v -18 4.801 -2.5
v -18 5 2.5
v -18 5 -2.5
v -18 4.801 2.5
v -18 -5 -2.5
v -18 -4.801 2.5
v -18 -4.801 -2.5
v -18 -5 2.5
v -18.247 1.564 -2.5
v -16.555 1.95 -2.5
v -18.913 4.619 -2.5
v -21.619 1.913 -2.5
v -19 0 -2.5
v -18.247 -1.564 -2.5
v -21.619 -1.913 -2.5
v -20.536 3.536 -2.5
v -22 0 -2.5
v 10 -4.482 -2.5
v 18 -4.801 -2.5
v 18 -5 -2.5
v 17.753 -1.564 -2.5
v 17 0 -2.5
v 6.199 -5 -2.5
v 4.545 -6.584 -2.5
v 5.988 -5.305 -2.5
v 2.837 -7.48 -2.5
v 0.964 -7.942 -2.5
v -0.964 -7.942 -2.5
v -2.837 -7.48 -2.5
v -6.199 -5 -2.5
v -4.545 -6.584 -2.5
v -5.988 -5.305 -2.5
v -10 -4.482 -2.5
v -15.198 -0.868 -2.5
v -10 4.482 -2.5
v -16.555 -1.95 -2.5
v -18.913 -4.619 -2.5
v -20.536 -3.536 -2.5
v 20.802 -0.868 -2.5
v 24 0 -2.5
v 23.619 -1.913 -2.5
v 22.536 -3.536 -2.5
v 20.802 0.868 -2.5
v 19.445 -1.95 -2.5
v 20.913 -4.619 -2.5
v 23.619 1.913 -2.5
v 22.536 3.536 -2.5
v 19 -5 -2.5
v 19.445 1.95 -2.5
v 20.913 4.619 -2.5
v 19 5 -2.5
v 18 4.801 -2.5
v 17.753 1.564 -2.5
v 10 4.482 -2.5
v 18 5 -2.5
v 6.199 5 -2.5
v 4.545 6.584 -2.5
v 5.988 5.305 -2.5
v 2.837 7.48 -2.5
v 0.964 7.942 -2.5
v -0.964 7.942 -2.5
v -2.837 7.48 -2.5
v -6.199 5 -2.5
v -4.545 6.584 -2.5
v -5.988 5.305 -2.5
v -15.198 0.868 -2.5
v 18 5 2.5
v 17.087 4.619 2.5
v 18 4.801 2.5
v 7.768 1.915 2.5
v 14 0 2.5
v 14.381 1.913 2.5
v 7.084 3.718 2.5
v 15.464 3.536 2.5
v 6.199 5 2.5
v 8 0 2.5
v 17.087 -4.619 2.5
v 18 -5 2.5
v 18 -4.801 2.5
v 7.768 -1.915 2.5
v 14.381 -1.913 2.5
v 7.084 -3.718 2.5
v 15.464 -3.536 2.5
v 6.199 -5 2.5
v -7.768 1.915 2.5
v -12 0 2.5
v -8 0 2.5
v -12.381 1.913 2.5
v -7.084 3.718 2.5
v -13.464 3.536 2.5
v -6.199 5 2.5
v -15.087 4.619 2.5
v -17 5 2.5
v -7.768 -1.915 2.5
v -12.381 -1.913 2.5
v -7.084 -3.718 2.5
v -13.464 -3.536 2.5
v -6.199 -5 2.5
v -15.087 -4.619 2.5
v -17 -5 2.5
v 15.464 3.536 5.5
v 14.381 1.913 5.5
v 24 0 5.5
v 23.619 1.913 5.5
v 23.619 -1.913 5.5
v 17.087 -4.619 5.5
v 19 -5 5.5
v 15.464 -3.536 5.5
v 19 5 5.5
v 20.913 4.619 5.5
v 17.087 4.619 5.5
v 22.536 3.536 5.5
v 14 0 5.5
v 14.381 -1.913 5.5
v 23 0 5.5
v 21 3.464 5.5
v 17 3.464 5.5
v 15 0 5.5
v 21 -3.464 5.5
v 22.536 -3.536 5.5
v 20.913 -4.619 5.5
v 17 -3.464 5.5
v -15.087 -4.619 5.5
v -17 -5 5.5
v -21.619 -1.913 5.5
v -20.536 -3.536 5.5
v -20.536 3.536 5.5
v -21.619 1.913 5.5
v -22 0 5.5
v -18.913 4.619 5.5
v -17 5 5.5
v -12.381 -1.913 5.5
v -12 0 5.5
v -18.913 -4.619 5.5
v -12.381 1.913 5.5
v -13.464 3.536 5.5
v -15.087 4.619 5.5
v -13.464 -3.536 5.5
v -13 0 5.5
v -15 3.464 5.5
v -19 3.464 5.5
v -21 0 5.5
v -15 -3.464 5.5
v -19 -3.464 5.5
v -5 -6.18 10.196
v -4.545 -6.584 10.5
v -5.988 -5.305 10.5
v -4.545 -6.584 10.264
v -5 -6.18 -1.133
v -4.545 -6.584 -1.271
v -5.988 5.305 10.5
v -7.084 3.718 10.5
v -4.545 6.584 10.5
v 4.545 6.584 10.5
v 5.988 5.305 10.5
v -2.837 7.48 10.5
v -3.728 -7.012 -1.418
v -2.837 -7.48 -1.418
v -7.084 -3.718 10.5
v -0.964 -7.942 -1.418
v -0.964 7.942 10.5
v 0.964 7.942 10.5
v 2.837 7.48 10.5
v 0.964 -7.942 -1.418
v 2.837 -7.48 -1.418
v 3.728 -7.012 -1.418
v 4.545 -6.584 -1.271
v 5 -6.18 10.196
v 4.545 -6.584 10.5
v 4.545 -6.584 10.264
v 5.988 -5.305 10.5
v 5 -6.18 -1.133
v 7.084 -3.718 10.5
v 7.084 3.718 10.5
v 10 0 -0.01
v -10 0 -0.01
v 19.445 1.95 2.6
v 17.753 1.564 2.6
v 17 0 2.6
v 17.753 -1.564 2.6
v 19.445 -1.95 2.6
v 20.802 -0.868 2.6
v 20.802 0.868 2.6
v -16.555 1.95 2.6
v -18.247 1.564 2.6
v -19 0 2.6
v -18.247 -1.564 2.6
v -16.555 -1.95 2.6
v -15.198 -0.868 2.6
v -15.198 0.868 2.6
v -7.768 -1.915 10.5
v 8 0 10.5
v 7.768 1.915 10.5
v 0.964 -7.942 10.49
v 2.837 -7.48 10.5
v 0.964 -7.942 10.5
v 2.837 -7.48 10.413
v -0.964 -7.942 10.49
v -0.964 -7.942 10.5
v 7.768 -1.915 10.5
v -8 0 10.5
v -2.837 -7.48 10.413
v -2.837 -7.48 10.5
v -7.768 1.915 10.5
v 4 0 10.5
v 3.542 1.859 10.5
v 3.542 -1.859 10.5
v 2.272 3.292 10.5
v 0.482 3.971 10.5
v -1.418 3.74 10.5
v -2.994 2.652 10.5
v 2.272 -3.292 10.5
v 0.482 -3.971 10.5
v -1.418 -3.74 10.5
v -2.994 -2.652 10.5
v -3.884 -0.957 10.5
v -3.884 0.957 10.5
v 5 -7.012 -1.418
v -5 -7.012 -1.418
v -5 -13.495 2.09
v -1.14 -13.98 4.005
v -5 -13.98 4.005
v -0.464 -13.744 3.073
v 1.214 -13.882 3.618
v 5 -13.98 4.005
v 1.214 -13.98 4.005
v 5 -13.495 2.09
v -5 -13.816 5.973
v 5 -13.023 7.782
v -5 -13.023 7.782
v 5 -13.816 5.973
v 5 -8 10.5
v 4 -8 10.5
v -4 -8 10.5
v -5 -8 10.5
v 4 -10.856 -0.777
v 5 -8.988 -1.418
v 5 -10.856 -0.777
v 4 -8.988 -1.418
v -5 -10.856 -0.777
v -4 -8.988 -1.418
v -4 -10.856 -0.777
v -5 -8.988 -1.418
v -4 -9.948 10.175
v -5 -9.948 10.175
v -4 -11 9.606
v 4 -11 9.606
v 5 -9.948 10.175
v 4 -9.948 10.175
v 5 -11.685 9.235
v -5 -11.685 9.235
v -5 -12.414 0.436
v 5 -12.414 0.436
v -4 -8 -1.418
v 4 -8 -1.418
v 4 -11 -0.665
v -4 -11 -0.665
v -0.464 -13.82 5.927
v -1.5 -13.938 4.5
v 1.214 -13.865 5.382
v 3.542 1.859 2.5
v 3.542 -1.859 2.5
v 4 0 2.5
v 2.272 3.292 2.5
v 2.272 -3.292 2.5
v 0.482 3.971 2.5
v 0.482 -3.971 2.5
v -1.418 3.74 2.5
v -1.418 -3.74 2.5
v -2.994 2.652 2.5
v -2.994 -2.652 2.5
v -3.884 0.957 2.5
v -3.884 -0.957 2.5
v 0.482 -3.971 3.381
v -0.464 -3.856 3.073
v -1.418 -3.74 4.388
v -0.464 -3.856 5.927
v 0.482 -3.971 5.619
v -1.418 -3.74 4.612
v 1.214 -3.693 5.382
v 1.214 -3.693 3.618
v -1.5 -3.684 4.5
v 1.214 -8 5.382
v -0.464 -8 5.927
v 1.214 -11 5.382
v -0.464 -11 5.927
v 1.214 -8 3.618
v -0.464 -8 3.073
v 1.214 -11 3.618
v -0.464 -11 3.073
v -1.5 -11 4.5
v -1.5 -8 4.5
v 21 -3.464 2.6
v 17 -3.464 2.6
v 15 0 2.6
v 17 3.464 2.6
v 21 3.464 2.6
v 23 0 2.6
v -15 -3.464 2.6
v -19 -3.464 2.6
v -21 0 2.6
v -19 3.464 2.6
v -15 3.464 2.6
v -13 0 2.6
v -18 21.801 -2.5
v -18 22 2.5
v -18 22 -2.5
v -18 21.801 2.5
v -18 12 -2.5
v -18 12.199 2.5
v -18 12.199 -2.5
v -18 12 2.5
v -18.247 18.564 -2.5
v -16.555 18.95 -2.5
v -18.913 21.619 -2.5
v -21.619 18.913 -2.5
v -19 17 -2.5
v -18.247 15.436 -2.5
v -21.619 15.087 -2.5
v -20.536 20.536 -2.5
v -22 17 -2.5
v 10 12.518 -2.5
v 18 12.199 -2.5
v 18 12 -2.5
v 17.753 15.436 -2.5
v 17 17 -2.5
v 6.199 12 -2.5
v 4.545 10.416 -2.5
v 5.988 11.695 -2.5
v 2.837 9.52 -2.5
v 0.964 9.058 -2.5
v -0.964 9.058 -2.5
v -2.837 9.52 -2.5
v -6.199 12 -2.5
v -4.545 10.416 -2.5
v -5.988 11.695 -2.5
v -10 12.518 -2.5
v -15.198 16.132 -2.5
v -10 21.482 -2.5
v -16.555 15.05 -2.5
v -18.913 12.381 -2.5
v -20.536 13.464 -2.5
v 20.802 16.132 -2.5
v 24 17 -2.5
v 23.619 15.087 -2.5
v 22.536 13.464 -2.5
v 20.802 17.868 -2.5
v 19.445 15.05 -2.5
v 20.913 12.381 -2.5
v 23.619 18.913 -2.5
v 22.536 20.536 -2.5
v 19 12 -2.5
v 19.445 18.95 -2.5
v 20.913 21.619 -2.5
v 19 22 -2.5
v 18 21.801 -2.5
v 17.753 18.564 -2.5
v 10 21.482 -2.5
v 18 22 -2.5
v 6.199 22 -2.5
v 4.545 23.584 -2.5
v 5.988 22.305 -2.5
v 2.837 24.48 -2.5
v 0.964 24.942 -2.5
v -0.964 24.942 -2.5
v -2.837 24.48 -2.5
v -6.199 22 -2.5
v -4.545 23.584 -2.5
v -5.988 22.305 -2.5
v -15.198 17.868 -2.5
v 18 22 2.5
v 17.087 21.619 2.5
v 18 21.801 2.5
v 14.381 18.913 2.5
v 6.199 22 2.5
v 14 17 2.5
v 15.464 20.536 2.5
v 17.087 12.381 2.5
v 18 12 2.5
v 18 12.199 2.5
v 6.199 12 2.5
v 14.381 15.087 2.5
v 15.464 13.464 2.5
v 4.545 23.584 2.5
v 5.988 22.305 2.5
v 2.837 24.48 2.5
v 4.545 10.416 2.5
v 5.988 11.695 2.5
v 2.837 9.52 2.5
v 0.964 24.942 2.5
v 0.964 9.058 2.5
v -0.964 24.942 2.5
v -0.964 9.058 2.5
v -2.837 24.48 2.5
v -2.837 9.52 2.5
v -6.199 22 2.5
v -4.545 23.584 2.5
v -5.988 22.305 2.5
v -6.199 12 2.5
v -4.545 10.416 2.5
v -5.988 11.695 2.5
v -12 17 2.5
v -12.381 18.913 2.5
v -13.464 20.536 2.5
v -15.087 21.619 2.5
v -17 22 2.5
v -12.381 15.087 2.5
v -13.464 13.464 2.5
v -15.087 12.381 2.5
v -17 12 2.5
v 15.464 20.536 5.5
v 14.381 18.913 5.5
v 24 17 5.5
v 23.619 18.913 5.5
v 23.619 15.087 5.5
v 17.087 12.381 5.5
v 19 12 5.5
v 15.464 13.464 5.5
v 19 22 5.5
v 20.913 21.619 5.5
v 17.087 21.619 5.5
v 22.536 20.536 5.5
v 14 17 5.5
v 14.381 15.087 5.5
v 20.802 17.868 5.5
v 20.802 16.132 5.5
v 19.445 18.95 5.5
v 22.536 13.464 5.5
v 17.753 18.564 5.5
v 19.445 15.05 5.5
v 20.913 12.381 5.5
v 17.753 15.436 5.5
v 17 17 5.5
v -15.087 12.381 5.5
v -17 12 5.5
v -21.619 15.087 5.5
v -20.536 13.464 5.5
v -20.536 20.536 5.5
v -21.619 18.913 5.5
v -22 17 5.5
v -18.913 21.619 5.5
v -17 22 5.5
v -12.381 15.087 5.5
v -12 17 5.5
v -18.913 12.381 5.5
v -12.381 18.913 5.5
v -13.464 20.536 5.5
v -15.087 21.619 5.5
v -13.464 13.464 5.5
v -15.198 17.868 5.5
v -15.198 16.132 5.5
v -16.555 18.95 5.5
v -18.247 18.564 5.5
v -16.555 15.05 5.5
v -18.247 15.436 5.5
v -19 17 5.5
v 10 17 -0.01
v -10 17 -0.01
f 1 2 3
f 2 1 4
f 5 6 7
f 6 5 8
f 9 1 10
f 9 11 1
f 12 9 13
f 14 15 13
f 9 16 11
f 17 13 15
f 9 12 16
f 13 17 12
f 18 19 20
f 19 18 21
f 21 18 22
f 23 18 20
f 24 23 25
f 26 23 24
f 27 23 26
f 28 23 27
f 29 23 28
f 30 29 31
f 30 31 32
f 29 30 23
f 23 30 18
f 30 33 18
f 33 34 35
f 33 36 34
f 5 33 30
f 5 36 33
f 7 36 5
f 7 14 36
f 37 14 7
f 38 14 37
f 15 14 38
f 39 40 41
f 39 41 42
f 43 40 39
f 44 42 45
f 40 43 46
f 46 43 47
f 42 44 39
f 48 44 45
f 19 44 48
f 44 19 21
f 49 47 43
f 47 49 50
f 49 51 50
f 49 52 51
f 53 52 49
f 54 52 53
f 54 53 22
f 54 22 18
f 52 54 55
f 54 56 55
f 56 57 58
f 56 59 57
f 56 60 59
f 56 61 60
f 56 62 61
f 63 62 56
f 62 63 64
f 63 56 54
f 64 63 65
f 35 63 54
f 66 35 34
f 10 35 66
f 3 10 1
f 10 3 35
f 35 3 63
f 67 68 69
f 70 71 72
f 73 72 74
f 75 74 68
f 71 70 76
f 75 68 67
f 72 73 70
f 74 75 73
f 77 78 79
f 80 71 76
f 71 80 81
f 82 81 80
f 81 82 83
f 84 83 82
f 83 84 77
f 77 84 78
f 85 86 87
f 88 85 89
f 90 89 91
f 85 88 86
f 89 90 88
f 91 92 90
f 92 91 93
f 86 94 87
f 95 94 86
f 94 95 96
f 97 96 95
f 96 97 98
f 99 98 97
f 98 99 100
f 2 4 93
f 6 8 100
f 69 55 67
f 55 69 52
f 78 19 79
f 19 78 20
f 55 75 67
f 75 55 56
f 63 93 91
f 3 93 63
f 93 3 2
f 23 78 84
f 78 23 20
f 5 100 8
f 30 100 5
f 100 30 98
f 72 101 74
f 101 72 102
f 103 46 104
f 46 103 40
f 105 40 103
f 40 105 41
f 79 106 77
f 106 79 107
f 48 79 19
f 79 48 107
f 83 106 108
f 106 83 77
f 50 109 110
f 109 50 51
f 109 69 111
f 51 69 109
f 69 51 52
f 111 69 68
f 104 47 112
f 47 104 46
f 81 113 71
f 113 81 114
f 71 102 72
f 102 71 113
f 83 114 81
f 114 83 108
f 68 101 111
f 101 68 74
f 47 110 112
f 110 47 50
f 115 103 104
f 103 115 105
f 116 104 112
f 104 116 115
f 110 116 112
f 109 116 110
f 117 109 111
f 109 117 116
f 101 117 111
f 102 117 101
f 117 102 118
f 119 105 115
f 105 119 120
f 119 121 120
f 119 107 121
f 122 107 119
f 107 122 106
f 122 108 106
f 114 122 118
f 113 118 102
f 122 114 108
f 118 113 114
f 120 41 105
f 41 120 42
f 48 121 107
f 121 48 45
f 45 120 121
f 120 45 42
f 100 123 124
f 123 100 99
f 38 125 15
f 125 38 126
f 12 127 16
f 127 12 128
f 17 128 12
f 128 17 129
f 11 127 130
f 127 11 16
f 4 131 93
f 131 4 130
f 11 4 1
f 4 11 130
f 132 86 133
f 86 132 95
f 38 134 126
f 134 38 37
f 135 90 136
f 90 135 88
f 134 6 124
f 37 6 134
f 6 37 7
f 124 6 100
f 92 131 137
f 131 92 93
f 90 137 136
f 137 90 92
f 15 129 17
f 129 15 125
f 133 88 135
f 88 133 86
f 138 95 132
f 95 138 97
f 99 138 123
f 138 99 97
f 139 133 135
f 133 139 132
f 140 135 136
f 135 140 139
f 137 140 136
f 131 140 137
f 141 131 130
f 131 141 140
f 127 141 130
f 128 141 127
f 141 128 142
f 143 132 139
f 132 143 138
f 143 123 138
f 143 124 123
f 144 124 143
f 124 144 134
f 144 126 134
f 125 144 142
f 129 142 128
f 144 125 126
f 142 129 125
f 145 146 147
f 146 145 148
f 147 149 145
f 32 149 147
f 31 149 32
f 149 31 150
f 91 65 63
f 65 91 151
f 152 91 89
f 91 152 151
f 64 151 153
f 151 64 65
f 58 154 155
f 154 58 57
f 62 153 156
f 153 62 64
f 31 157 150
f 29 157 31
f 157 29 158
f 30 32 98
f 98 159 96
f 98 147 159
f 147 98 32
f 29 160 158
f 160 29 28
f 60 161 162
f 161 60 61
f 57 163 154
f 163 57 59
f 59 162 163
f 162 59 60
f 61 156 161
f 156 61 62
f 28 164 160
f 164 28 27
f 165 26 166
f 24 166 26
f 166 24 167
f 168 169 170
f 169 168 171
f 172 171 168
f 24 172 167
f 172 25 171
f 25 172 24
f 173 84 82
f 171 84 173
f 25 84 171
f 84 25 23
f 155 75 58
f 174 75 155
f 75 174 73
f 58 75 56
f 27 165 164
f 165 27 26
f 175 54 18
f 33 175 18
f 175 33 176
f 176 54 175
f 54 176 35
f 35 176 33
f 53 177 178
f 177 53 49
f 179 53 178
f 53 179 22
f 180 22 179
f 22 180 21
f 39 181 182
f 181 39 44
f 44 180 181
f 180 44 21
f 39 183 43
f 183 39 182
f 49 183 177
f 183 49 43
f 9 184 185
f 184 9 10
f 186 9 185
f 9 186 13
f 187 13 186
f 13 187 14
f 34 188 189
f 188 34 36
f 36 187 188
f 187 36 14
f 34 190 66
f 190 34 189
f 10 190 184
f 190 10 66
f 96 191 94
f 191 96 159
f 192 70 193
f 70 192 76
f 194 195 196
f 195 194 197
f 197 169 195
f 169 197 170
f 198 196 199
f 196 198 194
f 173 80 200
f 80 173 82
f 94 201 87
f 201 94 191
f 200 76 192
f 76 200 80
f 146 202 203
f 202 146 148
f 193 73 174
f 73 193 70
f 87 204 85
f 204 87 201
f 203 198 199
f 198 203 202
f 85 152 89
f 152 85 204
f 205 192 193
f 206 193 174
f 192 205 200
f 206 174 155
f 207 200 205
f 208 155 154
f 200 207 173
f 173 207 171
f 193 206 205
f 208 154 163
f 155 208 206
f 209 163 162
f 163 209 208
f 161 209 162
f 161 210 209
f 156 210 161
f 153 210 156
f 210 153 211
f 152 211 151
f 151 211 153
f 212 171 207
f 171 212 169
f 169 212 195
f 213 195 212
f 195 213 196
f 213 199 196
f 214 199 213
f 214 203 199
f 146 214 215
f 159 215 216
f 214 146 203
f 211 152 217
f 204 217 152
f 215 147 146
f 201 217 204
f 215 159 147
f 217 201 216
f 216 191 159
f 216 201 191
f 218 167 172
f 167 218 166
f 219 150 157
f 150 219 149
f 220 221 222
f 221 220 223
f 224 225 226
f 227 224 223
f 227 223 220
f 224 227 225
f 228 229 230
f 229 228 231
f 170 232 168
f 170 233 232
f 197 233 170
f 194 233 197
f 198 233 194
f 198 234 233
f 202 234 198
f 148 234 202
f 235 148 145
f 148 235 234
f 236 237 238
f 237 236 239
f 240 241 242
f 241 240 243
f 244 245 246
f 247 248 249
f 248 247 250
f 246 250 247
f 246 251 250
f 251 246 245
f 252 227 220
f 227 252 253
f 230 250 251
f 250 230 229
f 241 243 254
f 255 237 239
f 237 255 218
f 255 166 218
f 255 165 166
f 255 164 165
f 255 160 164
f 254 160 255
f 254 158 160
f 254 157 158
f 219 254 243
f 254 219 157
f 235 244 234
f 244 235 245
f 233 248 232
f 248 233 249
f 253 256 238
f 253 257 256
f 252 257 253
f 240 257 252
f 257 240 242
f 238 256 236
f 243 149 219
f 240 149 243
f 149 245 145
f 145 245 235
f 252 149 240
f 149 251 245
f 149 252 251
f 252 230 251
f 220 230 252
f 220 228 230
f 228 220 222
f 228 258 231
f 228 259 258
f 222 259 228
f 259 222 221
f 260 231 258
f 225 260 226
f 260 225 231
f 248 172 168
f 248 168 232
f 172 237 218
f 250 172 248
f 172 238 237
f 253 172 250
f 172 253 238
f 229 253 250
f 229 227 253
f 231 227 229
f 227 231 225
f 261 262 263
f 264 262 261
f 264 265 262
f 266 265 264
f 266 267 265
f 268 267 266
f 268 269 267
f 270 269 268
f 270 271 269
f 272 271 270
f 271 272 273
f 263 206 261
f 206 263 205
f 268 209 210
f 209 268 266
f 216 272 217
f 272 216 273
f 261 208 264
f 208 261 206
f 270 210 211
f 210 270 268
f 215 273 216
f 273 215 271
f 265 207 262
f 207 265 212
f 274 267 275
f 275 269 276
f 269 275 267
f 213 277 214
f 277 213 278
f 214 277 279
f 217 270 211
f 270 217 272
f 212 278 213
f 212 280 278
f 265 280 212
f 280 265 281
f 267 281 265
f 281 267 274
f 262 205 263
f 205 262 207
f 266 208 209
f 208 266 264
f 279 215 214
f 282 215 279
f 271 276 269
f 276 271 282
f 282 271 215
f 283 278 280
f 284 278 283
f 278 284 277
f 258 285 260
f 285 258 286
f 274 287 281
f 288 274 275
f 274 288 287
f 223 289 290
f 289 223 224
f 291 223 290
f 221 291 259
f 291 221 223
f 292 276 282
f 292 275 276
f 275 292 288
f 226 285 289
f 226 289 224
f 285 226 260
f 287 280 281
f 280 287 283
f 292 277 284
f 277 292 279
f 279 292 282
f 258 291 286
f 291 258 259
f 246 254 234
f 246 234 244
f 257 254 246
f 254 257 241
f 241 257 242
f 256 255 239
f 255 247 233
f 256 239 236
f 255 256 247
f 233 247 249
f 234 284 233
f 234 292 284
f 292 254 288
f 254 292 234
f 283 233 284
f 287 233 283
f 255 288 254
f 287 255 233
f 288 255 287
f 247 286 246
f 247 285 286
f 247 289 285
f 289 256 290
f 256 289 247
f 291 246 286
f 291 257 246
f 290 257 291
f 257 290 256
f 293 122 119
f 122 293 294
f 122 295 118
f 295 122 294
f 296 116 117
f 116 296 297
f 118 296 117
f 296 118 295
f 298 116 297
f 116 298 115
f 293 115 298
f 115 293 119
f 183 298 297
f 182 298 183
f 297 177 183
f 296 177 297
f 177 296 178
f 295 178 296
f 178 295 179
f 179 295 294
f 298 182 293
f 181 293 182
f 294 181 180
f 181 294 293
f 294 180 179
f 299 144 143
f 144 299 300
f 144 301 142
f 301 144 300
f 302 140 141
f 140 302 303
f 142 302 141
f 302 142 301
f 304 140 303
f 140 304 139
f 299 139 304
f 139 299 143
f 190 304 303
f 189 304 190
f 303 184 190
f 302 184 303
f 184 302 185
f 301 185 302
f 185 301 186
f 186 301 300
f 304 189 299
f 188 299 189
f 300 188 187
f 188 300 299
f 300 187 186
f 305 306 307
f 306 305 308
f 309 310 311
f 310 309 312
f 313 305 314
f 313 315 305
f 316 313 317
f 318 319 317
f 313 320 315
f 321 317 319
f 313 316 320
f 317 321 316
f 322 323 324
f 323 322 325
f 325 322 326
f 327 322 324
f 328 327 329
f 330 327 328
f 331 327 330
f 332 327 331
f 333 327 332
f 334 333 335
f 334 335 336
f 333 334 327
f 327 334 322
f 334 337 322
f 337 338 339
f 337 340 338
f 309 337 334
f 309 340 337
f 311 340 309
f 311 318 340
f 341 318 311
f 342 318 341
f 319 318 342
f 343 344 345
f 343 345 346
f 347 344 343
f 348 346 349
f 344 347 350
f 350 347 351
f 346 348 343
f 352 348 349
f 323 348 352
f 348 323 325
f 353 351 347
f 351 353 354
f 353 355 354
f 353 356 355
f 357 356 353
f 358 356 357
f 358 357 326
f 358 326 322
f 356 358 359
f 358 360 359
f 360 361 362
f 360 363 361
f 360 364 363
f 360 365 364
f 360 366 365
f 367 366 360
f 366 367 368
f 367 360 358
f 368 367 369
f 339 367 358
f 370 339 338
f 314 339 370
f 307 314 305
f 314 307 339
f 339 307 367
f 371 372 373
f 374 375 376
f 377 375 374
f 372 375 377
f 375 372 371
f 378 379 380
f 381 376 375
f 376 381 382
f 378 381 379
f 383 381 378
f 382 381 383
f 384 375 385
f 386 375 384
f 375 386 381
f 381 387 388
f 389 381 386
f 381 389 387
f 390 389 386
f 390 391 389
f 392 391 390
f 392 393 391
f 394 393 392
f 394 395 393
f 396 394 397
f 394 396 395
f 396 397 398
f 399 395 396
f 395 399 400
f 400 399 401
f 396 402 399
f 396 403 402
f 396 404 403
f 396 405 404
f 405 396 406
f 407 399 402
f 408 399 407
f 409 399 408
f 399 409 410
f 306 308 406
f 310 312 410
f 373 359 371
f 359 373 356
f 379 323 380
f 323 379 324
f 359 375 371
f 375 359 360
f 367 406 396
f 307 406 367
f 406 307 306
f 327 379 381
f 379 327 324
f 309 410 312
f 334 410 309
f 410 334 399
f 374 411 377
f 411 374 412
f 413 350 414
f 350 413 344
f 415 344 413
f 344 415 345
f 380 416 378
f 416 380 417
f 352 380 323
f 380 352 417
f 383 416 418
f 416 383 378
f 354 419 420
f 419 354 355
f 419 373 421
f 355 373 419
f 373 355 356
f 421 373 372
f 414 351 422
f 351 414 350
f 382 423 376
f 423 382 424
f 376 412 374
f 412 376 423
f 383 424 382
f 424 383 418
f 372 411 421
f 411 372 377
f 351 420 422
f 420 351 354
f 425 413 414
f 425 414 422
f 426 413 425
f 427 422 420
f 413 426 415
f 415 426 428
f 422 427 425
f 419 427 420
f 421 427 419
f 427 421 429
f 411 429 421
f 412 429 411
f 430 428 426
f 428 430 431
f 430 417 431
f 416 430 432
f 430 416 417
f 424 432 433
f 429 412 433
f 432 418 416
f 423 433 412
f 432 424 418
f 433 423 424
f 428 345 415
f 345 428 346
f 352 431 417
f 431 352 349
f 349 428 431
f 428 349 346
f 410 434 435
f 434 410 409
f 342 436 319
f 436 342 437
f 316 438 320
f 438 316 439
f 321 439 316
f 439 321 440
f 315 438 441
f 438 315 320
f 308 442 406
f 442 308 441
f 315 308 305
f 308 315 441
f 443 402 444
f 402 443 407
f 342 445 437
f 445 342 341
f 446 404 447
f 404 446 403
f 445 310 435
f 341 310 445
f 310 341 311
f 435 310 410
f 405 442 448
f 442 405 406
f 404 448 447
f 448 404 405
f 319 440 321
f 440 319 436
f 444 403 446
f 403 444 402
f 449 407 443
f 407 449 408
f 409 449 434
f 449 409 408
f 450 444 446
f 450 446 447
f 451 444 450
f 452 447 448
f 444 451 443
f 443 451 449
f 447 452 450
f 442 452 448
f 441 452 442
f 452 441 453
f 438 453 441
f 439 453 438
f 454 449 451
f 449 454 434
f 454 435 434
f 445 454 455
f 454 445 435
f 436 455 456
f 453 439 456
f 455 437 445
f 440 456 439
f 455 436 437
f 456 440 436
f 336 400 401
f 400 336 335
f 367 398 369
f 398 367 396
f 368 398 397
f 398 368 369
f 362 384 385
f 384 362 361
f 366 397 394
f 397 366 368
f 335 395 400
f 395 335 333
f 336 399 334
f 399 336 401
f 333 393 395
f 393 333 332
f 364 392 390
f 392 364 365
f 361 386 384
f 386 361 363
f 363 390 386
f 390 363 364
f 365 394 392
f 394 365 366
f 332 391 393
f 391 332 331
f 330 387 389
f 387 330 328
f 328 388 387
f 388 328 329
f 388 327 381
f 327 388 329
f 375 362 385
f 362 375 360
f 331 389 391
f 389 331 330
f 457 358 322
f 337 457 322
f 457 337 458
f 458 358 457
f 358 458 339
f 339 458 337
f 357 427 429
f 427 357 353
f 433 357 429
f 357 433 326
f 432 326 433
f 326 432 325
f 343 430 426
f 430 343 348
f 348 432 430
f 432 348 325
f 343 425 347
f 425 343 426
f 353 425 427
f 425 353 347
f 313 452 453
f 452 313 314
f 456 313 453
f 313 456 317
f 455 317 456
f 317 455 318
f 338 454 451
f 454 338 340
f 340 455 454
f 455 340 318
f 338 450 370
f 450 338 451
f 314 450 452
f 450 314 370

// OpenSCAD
// lens holder for 25 mm lenses, to fit onto 8 mm bar
// GNU GPLv2
// by amk


h =8; //height of cylinder section to fit over 8 mm bar
l=28; //separation of vertical screws > lens diameter
module a()
{
difference(){
difference(){
union(){
translate([0, 0,0])cube([l+8,10,5], center=true);
translate([-((l+8)/2)-1, 0,-1.5])cylinder(8,5,5, center=true);
translate([((l+8)/2)-1, 0,-1.5])cylinder(8,5,5, center=true);
translate([0, 0,0])cylinder(5,8,8, center=true);
}
translate([0, -4.5, 2.51])rotate([90,0,90]) linear_extrude(height = 20, center = true, convexity = 10, twist = 0) polygon( points=[[0,0],[9,0],[4.5,-2.5]] );
}

translate([(-(l+8)/2)-1, 0,0])cylinder(14,2,2, center=true);
translate([((l+8)/2)-1, 0,0])cylinder(14,2,2, center=true);

}

}


module b(){
rotate([0,180,0])translate([0, 0,2.5])cylinder(h,8,8, center=false);
translate([0, -8,-h+3.5])rotate([0,90,0])cylinder(10,6,6, center=true); //cylinder for grub screw
//translate([0, -8,-h+3.5])sphere(6, center=true); // or sphere for grub screw
}





module c(){
difference(){
union(){
a();
b();
}
rotate([0,180,0])translate([0, 0,2.5])cylinder(h+2,4,4, center=false);
translate([0, -8,-h+3.5])rotate([90,0,0])cylinder(20,1.5,1.5, center=true);
translate([0, -9.5,-h+3.5])cube([8,3,12], center=true);
translate([(-(l+8)/2)-1,0,-4.1])cylinder(r=4, h=3, center=true, $fn=6); 
translate([((l+8)/2)-1,0,-4.1])cylinder(r=4, h=3, center=true, $fn=6); 
}
}

rotate([0,180,0]) c();
rotate([0,180,0]) translate([0,17,0]) a();
